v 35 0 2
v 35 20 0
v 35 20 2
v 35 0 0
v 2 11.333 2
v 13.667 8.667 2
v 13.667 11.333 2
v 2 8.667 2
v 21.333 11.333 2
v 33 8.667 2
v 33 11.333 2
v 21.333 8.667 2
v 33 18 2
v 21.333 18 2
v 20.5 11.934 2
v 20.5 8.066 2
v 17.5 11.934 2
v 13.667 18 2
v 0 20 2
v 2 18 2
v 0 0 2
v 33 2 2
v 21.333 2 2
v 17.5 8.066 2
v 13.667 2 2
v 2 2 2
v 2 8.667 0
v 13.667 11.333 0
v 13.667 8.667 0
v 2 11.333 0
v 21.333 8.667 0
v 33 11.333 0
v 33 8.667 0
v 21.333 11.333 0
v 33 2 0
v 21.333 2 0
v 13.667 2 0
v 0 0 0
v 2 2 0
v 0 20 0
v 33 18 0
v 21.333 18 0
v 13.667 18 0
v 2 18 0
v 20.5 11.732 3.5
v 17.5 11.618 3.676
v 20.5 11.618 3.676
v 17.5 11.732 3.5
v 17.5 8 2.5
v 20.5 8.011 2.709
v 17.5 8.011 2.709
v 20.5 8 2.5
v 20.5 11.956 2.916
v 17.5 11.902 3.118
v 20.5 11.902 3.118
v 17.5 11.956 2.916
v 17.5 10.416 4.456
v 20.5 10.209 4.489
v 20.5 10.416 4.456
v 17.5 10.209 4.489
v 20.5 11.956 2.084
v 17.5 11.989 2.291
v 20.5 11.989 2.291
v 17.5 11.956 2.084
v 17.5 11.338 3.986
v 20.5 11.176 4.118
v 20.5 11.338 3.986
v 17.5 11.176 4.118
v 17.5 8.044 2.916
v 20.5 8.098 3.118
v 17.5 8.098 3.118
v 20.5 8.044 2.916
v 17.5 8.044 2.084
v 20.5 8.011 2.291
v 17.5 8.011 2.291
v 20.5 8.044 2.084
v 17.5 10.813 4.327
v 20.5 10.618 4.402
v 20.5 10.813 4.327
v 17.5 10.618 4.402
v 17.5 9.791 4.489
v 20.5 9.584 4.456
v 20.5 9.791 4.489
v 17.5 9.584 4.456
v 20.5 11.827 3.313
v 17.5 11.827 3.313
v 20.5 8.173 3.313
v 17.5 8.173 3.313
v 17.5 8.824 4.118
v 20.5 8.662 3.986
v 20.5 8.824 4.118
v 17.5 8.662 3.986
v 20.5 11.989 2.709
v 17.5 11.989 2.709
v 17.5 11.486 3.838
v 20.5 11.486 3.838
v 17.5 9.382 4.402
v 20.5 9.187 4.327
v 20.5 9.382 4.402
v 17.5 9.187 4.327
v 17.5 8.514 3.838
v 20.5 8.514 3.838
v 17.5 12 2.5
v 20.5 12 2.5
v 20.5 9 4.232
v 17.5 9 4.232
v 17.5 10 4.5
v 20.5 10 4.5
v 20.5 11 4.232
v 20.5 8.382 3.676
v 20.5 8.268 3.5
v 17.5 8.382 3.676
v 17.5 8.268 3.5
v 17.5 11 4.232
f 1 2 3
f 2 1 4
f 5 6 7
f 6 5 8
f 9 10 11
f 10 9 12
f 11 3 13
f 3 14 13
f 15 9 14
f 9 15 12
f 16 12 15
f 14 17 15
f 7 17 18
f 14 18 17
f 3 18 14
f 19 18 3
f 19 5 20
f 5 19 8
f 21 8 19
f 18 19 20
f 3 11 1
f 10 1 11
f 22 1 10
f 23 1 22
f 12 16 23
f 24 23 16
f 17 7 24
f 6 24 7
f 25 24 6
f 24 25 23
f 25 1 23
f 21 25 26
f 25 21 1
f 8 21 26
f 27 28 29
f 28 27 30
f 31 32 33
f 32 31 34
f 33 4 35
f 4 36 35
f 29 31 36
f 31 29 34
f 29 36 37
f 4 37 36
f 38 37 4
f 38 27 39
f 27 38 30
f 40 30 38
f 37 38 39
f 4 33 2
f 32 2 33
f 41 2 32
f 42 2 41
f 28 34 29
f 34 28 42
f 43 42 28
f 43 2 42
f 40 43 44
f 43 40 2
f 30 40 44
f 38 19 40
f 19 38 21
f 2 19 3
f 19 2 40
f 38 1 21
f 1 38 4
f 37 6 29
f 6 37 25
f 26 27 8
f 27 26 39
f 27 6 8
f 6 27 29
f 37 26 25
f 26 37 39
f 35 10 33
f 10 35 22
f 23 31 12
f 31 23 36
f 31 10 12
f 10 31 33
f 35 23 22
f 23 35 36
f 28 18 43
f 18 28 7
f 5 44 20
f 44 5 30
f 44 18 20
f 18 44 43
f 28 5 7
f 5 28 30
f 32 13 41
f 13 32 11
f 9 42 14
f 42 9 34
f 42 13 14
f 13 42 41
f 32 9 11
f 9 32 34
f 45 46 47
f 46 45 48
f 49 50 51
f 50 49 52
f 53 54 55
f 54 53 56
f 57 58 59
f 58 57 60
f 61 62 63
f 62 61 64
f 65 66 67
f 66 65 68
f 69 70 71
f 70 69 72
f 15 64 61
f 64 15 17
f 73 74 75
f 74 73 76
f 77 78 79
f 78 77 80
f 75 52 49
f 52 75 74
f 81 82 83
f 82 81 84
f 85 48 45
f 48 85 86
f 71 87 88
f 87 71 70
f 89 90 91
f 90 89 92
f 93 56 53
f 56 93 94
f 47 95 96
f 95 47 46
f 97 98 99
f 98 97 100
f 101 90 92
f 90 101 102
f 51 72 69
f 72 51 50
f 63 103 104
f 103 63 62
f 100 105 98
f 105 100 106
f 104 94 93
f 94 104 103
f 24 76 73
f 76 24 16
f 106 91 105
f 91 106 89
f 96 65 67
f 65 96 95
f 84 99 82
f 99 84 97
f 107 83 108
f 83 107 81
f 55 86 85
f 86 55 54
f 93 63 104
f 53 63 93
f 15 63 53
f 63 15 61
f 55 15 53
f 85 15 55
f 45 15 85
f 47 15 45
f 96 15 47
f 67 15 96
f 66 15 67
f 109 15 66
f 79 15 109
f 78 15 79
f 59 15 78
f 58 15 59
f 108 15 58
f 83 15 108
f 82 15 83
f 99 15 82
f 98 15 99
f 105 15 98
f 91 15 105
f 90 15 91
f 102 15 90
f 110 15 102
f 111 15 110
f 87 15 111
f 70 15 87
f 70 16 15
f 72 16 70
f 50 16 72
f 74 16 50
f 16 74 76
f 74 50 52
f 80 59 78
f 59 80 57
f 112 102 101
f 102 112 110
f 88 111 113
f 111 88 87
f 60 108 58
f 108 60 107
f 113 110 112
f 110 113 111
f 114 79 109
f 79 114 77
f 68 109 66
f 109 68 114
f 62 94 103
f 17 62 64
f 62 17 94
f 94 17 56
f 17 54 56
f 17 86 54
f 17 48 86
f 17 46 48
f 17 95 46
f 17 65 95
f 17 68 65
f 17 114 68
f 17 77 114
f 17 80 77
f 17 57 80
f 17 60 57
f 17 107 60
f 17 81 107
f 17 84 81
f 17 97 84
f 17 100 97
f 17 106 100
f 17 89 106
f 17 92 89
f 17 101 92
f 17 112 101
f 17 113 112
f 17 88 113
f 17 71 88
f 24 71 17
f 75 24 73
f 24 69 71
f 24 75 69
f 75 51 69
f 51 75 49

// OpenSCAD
$fn=60;

RodRadius = 2.5;
RodHoleRadius = 2.55;
SwingWidth = 12.5;
SwingMountWidth = SwingWidth + 0.5;

StickHole = 5.05;
Stick = 4.95;

//translate([0, 0, 5]) 
//color("red") rotor();

//translate([0, 30, 0])
//color("blue") base();  

//translate([0, -27, 21]) 
//color("yellow") swing();

//translate([-30, 0, 0]) 
//color("green") rod();

//color("pink") base();

//color("black") stick();

//color("red") connector();

color("red") helijoint();

module rotor()
{      
  difference()
  {     
    union()
    {
      difference() 
      {
        translate([0, 0, 12.5])
          sphere(r = 25);
          
        translate([-25, -25, -50])
          cube([50, 50, 50]);
      }
      
      translate([0, 0, 6.25])
        cylinder (h = 12.5, r = 25, center = true);
    }
    
    translate([0, 0, 0])
      cylinder (h = 50, r=5, center = true);
      
     translate([0, 0, -1])
      cylinder (h = 6, r=9.55, center = false);          
        
      
    difference()
    {
      translate([0, 0, 37.5])
        rotate([0,90,0])              
          cylinder (h = SwingMountWidth, r=25, center = true);  
     
      translate([-50/2, 10, 20])
        cube([50, 50, 50]); 
    }    
      
    translate([0, 0, 27.5])
      rotate([0,90,0])
        cylinder (h = 75, r=RodHoleRadius, center = true);
    
    translate([-SwingMountWidth/2, -25, 20])
        cube([SwingMountWidth, 20, 20]); 
  }  
  
     
}
  
module base()
{      
  difference()
  {   
    union()
    {        
      translate([-37.5, -37.5, 0])
        cube ([75, 75, 5]);    
    
      translate([0, 0, 5])
        cylinder (h = 6, r=4.95);
    } 
    
    translate([-25, -25, 0])
      cylinder (h = 20, r=2, center = true);
    
    translate([-25, 25, 0])
      cylinder (h = 20, r=2, center = true);
    
    translate([25, -25, 0])
      cylinder (h = 20, r=2, center = true);
    
    translate([25, 25, 0])
      cylinder (h = 20, r=2, center = true);
  }
}   
  
module swing()
{     
  difference()
  {     
    union()
    {
      translate([0, 30, 6.25])
        rotate([0, 90, 0])           
          cylinder (h = SwingWidth, r=6.25, center = true); 
    
      translate([-SwingWidth / 2, 0, 0])  
        cube([SwingWidth, 30, 12.5]);      
    }    
    
    translate([0, 27.5, 6.25])
      rotate([0, 90, 0])           
        cylinder (h = 25, r=RodHoleRadius, center = true);  
    
    translate([-StickHole/2, -5, 3.5])    
      cube([StickHole, 20, StickHole]);  
  }
}  

module rod()
{     
  union()
  {
    translate([0, 0, 0]) 
      cylinder (h = 1, r = 12.5, center = false);  
   
    translate([0, 0, 1])
        rotate([0,0,0])
          cylinder (h = 42, r=RodRadius, center = false);
   }     
}

module stick()
{
  cube([180, Stick, Stick], center = true);  
}

module connector()
{     
  difference()
  {         
    translate([-SwingWidth / 2, 0, 0])  
      cube([SwingWidth, 30, 12.5]);   
    
    translate([-StickHole/2, -5, 3.5])    
      cube([StickHole, 20, StickHole]);  
    
    translate([-StickHole/2, -5, 3.5])    
      cube([StickHole, 20, StickHole]); 
  }
} 

module helijoint()
{
  length = 35;
  width = 20;
  depth = 2;
  border = 2;
  
  union()
  { 
    difference()
    {
      translate([0, 0, 0])
        cube([length, width, depth]);  
      
      translate([border, border, -1])
        cube([length/3, width/3, depth*2]);
      
      translate([length-length/3-border, border, -1])
        cube([length/3, width/3, depth*2]);
      
      translate([border, width-width/3-border, -1])
        cube([length/3, width/3, depth*2]);
      
      translate([length-length/3-border, width-width/3-border, -1])
        cube([length/3, width/3, depth*2]);
    } 
    
    translate([length/2, width/2, 5/2])
      rotate([0,90,0])
        cylinder (h = 3, r=2, center = false);
  }
}


      
    


    
    
